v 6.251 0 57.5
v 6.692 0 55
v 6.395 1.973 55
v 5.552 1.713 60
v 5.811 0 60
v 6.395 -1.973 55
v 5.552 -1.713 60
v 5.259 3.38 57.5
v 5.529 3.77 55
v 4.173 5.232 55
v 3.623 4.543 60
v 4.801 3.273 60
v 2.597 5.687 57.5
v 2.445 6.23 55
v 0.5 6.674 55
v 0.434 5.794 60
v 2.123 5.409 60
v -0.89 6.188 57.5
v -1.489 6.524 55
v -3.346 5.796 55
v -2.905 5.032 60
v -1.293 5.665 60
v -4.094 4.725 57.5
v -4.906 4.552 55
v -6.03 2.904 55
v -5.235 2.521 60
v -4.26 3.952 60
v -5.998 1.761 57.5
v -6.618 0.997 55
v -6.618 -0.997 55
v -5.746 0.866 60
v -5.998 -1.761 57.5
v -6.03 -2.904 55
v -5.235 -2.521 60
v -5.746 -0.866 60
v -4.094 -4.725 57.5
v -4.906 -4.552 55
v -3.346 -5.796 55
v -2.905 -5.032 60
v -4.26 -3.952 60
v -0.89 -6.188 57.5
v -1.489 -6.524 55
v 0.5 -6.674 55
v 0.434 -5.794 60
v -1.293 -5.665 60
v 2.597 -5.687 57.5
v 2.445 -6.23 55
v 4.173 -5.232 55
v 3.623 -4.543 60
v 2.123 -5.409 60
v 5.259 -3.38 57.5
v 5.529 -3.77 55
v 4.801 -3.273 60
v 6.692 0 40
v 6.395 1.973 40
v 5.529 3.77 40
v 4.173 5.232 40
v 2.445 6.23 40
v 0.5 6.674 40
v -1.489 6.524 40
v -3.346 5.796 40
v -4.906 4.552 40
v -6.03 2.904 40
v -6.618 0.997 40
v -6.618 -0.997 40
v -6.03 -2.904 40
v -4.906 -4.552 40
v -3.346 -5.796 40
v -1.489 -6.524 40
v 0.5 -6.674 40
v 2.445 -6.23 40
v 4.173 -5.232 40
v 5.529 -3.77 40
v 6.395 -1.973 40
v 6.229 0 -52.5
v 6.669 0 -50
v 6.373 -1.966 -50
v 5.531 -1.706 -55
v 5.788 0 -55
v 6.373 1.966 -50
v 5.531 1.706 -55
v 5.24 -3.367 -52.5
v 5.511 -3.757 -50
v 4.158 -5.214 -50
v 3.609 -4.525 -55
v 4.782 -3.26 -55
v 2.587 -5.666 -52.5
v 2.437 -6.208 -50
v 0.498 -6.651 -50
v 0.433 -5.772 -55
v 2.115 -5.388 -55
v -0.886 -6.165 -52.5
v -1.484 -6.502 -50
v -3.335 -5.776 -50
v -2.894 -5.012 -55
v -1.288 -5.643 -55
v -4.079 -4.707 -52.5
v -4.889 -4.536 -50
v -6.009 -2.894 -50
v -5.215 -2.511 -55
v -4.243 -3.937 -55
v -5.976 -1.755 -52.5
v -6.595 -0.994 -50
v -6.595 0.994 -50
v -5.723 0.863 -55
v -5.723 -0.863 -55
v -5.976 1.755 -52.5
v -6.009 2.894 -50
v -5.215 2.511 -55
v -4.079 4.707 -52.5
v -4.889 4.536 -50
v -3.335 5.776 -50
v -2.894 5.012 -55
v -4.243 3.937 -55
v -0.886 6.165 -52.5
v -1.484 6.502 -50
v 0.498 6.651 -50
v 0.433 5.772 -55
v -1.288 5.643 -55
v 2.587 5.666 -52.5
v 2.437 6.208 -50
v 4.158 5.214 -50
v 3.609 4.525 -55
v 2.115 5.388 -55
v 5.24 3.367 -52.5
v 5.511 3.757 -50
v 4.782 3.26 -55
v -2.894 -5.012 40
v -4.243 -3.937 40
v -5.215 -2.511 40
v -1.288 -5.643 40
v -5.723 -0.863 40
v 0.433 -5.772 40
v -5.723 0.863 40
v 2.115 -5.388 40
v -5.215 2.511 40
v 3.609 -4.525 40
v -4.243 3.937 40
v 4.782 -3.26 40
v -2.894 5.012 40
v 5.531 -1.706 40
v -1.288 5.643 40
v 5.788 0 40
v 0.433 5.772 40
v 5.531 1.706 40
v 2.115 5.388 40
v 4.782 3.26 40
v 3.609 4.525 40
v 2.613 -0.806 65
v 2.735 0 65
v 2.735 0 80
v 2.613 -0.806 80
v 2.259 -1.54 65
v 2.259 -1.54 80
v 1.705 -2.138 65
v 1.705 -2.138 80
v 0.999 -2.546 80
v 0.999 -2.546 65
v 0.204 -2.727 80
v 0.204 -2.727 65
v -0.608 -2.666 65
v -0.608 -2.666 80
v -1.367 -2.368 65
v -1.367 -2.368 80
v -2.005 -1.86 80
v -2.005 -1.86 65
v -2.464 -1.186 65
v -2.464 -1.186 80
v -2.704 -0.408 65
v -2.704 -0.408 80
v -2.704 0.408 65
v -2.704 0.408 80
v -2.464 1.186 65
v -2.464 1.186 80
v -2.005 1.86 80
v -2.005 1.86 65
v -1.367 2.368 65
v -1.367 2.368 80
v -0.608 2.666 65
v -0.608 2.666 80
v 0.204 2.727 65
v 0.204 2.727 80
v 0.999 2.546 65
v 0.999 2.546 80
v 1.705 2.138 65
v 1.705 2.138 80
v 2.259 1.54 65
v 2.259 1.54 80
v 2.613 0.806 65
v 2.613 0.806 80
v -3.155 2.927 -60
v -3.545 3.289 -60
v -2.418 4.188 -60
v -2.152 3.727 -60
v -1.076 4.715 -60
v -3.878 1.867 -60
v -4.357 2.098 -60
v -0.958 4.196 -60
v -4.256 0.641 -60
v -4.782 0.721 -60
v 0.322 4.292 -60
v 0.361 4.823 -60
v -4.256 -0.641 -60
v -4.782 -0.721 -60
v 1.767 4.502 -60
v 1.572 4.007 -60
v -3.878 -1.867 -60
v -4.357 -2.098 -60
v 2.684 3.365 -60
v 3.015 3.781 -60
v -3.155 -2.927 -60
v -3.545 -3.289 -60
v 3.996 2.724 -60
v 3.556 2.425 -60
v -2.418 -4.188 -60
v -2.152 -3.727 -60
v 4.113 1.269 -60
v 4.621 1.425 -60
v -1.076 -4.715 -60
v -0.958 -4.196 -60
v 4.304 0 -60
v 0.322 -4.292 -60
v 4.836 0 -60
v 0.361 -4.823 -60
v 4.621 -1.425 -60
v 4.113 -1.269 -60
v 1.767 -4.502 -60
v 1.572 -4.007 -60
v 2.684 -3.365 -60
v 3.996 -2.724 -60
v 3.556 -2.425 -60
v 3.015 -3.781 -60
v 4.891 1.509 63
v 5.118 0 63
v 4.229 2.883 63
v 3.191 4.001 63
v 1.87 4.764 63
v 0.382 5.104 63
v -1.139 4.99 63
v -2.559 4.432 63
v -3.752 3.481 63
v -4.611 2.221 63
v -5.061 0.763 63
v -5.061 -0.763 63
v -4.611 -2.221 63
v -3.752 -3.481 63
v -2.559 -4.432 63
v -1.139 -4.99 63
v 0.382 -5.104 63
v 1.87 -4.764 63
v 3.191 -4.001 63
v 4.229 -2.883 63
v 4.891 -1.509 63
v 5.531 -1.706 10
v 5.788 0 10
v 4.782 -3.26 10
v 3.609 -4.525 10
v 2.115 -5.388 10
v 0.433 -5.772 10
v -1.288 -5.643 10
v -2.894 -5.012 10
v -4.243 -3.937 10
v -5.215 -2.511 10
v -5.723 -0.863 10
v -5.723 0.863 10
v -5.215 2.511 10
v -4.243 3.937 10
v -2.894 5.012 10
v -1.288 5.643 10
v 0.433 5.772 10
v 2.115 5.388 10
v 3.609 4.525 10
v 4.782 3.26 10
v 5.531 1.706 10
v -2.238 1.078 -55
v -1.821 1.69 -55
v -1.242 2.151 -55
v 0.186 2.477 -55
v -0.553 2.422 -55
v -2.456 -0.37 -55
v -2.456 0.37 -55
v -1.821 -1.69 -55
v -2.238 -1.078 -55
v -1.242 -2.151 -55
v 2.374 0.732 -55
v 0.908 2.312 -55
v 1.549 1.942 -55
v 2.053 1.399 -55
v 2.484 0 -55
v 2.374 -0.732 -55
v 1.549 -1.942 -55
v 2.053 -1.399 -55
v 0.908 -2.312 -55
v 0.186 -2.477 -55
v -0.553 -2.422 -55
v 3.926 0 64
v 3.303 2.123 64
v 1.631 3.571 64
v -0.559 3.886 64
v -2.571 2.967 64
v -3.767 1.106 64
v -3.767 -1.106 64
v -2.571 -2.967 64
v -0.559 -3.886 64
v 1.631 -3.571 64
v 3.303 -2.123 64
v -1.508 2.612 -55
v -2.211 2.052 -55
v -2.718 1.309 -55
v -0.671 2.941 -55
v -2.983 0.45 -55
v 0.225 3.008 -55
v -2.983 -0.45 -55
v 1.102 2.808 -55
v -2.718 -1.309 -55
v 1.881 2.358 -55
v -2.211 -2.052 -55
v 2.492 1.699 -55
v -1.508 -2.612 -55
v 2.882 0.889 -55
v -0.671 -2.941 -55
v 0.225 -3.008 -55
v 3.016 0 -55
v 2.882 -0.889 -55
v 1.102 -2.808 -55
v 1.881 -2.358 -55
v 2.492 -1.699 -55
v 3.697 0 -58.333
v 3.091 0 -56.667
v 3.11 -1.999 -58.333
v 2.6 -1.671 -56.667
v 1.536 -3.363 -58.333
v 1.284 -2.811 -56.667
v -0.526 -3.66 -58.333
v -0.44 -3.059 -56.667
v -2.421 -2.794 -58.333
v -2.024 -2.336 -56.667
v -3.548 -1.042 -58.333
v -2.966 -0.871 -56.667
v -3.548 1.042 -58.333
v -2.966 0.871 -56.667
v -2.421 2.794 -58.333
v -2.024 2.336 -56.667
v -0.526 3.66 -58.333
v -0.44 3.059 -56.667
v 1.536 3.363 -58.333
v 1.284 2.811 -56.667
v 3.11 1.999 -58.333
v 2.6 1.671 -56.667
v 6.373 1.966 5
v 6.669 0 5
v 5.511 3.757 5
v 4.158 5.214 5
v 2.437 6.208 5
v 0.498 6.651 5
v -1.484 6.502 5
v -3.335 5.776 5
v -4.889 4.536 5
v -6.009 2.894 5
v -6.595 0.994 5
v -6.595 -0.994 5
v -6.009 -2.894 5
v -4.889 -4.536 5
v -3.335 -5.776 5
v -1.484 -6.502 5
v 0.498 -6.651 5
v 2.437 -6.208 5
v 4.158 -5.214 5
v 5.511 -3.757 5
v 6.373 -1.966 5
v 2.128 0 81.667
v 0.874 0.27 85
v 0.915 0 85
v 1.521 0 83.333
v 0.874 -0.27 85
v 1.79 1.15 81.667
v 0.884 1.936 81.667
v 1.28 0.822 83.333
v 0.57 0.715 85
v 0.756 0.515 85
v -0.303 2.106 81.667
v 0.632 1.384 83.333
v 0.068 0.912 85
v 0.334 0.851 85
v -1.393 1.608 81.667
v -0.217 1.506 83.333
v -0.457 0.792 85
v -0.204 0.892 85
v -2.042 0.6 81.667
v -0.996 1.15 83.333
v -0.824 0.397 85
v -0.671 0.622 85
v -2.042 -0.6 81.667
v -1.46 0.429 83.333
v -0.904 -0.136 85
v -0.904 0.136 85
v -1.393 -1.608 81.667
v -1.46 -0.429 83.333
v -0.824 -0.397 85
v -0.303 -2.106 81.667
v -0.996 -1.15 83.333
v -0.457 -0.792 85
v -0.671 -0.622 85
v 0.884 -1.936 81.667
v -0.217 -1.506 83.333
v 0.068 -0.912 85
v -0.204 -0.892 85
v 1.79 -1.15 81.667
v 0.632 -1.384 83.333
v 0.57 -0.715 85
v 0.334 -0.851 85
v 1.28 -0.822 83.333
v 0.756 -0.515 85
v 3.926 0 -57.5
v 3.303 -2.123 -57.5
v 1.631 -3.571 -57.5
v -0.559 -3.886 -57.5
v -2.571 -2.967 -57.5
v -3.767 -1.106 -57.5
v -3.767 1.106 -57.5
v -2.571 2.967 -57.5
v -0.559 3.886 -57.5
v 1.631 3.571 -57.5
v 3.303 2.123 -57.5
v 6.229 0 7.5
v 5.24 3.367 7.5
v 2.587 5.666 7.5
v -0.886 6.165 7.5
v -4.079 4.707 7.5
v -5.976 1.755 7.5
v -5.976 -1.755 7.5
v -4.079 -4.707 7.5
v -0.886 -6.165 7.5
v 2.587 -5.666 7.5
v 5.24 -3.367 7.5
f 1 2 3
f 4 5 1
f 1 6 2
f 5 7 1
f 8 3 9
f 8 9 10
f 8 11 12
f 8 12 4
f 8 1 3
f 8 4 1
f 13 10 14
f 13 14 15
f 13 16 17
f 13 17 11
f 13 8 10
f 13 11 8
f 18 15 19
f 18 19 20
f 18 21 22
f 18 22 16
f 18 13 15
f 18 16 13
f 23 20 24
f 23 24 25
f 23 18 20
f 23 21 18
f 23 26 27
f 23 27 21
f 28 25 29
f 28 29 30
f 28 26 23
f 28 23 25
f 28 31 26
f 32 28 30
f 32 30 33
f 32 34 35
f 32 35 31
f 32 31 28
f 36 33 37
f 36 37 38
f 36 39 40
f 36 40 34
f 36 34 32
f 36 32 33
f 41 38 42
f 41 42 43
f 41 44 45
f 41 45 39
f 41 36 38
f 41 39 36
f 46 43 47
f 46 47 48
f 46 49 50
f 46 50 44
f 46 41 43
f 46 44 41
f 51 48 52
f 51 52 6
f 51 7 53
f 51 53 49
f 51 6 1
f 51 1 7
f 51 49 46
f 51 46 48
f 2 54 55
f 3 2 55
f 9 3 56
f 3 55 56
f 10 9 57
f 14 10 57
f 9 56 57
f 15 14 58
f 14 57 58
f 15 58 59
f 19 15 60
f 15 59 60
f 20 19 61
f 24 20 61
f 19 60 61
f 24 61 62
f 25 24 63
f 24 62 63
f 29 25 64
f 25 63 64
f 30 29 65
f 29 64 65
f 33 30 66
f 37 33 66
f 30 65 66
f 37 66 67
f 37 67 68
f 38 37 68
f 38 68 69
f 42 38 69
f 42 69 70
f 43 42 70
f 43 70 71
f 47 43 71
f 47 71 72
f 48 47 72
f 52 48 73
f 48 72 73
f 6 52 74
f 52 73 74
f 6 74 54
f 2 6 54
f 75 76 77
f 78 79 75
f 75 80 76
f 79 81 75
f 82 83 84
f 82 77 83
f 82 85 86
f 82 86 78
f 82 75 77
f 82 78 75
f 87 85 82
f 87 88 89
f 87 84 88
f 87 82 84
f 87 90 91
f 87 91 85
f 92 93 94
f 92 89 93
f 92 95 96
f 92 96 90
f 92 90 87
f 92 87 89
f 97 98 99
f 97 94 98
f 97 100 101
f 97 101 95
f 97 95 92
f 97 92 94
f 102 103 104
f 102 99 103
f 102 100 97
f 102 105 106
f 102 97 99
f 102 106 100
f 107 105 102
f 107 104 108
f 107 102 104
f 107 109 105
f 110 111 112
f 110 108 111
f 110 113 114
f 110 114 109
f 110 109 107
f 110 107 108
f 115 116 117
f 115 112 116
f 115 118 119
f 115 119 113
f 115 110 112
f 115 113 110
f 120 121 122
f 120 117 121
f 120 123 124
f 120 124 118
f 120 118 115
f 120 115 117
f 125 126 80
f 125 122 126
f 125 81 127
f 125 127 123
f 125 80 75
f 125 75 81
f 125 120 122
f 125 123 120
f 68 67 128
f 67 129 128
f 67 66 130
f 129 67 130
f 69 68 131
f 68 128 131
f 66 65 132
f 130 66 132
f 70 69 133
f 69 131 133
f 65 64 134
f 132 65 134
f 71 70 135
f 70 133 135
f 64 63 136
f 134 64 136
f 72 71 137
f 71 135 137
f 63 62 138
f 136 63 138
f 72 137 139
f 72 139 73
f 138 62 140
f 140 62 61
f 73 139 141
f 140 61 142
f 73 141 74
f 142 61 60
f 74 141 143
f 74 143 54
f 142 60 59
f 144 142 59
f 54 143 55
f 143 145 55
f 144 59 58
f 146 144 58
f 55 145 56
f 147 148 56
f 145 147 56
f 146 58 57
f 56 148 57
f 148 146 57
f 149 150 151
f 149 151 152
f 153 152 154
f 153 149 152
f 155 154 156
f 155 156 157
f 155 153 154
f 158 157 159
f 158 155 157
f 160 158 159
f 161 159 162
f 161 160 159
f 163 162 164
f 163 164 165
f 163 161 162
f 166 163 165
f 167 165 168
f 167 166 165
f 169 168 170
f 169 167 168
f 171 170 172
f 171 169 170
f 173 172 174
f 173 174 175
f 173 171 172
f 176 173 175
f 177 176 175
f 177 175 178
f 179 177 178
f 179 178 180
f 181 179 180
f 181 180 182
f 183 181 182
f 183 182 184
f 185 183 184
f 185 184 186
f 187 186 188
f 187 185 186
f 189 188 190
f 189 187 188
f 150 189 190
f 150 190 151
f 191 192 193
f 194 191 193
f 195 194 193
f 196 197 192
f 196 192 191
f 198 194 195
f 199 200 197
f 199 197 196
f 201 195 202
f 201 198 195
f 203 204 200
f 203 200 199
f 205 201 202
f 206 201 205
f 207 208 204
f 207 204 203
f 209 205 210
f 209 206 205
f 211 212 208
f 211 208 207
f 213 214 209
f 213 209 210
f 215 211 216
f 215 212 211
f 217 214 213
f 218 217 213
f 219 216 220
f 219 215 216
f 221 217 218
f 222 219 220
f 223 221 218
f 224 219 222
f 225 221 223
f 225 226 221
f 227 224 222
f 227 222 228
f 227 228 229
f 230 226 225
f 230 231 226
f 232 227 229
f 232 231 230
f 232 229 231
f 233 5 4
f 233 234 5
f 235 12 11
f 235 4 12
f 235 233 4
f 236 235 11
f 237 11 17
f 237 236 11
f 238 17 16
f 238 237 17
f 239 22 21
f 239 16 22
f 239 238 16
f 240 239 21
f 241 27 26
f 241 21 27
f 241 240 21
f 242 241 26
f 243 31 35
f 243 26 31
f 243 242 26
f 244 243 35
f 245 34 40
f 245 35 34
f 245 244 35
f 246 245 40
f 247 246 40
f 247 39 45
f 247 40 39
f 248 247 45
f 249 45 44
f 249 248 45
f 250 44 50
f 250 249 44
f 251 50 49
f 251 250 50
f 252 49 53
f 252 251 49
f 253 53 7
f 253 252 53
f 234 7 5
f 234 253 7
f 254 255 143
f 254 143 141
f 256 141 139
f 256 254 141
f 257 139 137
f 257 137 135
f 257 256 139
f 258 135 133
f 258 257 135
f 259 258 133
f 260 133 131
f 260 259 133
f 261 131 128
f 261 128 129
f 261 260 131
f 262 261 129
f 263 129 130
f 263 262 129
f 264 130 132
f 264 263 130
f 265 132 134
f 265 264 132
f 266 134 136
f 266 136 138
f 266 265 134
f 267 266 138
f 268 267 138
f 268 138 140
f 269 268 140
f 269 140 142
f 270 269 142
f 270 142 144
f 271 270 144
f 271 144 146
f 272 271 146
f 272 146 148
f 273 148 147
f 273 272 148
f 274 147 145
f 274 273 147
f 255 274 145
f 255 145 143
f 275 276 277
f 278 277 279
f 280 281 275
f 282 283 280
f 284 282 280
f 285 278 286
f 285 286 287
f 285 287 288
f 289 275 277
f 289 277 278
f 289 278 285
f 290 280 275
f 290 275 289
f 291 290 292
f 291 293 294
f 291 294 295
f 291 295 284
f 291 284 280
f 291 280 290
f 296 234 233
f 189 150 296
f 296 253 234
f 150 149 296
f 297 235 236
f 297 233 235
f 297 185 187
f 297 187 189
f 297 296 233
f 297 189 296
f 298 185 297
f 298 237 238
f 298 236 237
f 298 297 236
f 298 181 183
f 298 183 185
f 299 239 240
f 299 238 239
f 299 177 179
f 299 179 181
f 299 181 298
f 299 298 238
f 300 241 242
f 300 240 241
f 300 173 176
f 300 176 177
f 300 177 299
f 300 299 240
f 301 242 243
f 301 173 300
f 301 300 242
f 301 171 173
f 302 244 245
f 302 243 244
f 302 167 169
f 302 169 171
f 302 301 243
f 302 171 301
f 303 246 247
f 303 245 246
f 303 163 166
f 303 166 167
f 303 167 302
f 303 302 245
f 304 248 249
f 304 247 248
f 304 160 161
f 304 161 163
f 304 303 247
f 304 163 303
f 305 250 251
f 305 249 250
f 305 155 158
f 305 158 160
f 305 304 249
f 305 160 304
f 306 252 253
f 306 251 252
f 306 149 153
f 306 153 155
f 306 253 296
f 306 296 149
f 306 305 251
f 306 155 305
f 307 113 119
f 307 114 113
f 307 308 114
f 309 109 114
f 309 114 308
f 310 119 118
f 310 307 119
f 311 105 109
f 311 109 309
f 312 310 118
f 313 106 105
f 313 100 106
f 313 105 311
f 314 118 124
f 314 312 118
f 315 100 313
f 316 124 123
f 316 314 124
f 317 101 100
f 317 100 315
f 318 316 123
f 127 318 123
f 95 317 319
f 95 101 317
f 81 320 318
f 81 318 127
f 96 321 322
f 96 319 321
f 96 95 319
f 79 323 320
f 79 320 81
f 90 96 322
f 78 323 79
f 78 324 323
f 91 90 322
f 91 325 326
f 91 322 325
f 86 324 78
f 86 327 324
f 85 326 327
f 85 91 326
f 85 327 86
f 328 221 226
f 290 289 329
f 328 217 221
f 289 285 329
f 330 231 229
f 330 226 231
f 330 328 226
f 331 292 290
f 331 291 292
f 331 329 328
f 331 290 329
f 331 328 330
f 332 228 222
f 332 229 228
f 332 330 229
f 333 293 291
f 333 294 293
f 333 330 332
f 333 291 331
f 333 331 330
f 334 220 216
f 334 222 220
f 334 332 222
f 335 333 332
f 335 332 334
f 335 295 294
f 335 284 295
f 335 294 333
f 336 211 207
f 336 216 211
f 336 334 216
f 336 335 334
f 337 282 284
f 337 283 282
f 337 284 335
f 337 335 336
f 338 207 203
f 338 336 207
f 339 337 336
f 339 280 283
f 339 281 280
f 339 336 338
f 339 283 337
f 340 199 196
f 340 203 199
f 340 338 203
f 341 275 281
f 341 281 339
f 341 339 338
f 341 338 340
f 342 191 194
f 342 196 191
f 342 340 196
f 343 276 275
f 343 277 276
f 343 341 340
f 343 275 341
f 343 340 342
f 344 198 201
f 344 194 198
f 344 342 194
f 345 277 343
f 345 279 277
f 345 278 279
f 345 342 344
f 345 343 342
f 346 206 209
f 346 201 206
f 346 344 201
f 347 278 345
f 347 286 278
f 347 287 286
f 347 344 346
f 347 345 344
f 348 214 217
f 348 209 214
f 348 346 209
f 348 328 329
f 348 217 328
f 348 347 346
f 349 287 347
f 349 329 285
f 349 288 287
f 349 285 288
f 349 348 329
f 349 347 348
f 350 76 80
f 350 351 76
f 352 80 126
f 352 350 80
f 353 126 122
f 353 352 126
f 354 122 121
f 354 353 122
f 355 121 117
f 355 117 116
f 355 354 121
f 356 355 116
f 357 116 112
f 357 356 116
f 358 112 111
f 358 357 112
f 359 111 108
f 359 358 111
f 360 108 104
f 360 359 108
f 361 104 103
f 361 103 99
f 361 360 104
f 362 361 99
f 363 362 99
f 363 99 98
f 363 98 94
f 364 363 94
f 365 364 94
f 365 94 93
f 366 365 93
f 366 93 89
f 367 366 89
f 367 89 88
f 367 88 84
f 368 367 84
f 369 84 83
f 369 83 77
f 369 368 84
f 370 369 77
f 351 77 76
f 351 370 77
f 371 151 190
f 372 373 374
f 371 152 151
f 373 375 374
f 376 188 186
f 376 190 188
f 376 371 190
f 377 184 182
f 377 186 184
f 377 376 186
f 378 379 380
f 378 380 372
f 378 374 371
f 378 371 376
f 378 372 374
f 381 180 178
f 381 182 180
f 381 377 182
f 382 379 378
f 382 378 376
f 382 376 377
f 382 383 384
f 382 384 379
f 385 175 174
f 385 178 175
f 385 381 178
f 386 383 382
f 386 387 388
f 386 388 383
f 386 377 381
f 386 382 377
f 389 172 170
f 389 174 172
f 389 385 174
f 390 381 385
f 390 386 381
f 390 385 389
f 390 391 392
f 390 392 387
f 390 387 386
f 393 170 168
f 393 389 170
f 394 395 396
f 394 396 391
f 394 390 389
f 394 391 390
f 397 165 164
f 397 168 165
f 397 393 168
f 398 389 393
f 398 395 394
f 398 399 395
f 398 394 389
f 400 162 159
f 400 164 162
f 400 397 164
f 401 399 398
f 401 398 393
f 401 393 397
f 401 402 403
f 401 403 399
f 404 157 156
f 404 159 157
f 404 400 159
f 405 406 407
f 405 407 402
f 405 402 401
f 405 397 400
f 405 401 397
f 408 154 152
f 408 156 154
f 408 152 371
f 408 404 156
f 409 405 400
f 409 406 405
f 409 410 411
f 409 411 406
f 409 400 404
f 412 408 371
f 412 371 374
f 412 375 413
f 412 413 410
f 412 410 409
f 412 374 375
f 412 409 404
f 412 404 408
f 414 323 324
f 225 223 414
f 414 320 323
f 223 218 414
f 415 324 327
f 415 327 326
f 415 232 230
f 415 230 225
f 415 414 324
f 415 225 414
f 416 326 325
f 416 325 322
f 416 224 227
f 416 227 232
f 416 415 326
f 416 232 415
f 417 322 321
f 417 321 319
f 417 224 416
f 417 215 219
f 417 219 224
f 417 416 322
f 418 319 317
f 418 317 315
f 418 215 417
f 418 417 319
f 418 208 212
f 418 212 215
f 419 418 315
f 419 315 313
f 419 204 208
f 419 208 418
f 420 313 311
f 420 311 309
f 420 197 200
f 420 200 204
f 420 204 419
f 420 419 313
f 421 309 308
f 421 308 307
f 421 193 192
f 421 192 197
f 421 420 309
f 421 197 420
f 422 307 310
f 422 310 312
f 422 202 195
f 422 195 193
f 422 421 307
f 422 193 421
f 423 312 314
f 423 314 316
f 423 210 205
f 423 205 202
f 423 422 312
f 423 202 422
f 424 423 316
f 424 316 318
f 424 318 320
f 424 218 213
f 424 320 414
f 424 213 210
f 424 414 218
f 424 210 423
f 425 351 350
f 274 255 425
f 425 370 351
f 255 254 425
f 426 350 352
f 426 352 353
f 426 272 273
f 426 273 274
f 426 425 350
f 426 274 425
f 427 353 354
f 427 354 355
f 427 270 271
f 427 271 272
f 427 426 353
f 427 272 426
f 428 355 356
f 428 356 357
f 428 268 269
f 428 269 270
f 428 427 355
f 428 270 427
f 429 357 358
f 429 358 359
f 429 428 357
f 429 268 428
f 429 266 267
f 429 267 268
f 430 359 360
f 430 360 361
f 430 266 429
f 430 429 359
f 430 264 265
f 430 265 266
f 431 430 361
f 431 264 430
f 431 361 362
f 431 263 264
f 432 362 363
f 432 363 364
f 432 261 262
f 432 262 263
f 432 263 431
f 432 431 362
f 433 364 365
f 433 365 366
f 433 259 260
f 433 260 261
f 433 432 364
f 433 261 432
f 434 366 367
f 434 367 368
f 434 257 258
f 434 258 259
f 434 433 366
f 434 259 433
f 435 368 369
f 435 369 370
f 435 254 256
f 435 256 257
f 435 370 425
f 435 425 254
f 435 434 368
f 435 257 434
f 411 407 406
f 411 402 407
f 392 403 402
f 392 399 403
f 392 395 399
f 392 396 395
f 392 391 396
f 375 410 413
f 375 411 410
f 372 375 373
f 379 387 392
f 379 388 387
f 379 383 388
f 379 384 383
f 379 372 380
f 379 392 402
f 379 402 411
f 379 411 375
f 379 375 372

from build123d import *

# Parameters (mm, degrees)
F0_R          = 6.6693816334
F1_DEPTH      = 5
F1_DEPTH_BACK = 50
F1_FACE_R     = 6.6693816334
F2_DEPTH      = 5
F2_TAPER      = 10
F1_FACE1_R    = 6.6693816334
F3_DEPTH      = 5
F3_TAPER      = 10
F4_R          = 3.0163554994
F5_DEPTH      = 5
F5_TAPER      = -20
F6_R          = 4.3040236216
F7_DEPTH      = 5
F7_TAPER      = 20
F8_DEPTH      = 30
F9_R          = 6.6922824671
F10_DEPTH     = 15
F10_FACE_R    = 6.6922824671
F11_DEPTH     = 5
F11_TAPER     = 10
F11_FACE_R    = 5.8106475635
F12_DEPTH     = 3
F12_TAPER     = 13
F12_FACE_R    = 5.1180429902
F13_DEPTH     = 2
F13_TAPER     = 50
F14_DEPTH     = 15
F14_FACE_R    = 2.734535805
F15_DEPTH     = 5
F15_TAPER     = 20


with BuildPart() as f1:
    # F0 (on Top) → F1 (new body, two sides)
    with BuildSketch(Plane.XY) as f1_sk:
        Circle(F0_R)
    extrude(amount=F1_DEPTH)
    extrude(f1_sk.sketch, amount=-F1_DEPTH_BACK)

    # F1_face (on face) → F2 (join)
    with BuildSketch(Plane.XY.offset(5)):
        Circle(F1_FACE_R)
    extrude(amount=F2_DEPTH, taper=F2_TAPER)

    # F1_face1 (on face) → F3 (join)
    with BuildSketch(Plane(origin=(0, 0, -50), x_dir=(1, 0, 0), z_dir=(0, 0, -1))):
        Circle(F1_FACE1_R)
    extrude(amount=F3_DEPTH, taper=F3_TAPER)

    # F4 (on face) → F5 (join)
    with BuildSketch(Plane(origin=(0, 0, -55), x_dir=(1, 0, 0), z_dir=(0, 0, -1))):
        Circle(F4_R)
    extrude(amount=F5_DEPTH, taper=F5_TAPER)

    # F6 (on face) → F7 (cut)
    with BuildSketch(Plane(origin=(0, 0, -60), x_dir=(1, 0, 0), z_dir=(0, 0, -1))):
        Circle(F6_R)
    extrude(amount=-F7_DEPTH, taper=F7_TAPER, mode=Mode.SUBTRACT)

    # F8 (add): a face of the model
    f8_faces = [f1.faces().sort_by_distance(p)[0] for p in [
        (0, 0, 10),
    ]]
    extrude(f8_faces, amount=F8_DEPTH)

    # F9 (on face) → F10 (join)
    with BuildSketch(Plane.XY.offset(40)):
        Circle(F9_R)
    extrude(amount=F10_DEPTH)

    # F10_face (on face) → F11 (join)
    with BuildSketch(Plane.XY.offset(55)):
        Circle(F10_FACE_R)
    extrude(amount=F11_DEPTH, taper=F11_TAPER)

    # F11_face (on face) → F12 (join)
    with BuildSketch(Plane.XY.offset(60)):
        Circle(F11_FACE_R)
    extrude(amount=F12_DEPTH, taper=F12_TAPER)

    # F12_face (on face) → F13 (join)
    with BuildSketch(Plane.XY.offset(63)):
        Circle(F12_FACE_R)
    extrude(amount=F13_DEPTH, taper=F13_TAPER)

    # F14 (add): a face of the model
    f14_faces = [f1.faces().sort_by_distance(p)[0] for p in [
        (0, 0, 65),
    ]]
    extrude(f14_faces, amount=F14_DEPTH)

    # F14_face (on face) → F15 (join)
    with BuildSketch(Plane.XY.offset(80)):
        Circle(F14_FACE_R)
    extrude(amount=F15_DEPTH, taper=F15_TAPER)


solid = f1.part
